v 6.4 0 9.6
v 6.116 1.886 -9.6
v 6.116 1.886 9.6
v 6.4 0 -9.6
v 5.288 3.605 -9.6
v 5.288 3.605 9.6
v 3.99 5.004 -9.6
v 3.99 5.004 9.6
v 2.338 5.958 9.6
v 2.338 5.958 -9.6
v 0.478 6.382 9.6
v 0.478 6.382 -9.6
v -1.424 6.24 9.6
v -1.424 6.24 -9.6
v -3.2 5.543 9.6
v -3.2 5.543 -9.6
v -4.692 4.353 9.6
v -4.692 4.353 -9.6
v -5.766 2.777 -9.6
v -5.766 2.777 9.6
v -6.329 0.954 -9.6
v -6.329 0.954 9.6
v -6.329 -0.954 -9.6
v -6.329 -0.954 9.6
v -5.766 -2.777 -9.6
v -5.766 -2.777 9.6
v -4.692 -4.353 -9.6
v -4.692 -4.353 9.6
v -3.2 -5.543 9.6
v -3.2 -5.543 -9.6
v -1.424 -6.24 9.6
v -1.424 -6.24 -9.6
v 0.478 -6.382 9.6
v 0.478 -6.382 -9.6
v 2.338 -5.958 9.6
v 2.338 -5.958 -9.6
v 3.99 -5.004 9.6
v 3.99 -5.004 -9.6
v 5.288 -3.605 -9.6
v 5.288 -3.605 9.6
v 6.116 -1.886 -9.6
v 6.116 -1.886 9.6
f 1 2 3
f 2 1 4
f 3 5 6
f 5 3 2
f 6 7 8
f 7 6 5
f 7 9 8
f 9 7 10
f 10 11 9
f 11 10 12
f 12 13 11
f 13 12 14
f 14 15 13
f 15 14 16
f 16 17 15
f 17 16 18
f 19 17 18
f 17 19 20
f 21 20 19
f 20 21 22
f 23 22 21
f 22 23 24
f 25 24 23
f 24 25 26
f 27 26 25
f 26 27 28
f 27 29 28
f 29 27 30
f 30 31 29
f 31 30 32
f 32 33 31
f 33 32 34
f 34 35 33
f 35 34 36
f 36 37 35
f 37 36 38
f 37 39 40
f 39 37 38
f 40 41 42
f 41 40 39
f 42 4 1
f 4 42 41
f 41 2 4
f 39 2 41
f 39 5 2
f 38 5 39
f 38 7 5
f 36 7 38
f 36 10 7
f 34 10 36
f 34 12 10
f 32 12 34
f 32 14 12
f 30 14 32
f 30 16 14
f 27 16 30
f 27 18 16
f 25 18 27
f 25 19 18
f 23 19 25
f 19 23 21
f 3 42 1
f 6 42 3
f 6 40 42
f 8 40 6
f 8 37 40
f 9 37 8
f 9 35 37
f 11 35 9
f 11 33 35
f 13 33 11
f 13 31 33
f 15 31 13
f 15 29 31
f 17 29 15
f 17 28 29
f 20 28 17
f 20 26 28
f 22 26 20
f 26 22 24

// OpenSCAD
// file: ../configurations/global.scad
// gold_number = 1.618;

housing_facades_throws_diameter = 3.8;

// external size
case_external_x_size = 165;
case_external_y_size = 92;
case_external_z_size = 38;
case_external_panes_thickness = 4.8;

facade_front_round_edges_radius = 5;
facade_throws_margin = 5;

// facade corners
facade_corners_offset_lenght = 9;
facade_corners_main_x_size = 19;
facade_corners_main_y_size = 19;
facade_corners_main_thickness = 11;
facade_corners_correction_offset_length = 0.2;
facade_corners_correction_offset_thickness = 0.0;
facade_fn = 100;


// Generics
insert_throw_diameter = 4.2;
insert_throw_length = 6 + 2;


// mother board
mother_board_cny70set_x_point_coord = 10;
mother_board_cny70set_y_point_coord = 7;



// Cassette
cassette_x_size = 50;
cassette_y_size = 31;
cassette_z_size = 4.8;
cassette_round_radius = 4;

// Cassette case
cassette_case_x_size = 76.2;
cassette_case_y_size = 55.88;
cassette_case_z_size = 9;
cassette_case_round_radius = 1;

cassette_case_x_y_margin = 0.75;

cassette_case_embed_x_size = 62;
cassette_case_embed_y_size = 42;
cassette_case_embed_z_size = 4.8;
cassette_case_embed_offsets = 10;
cassette_case_embed_round_radius = 6;

cassette_case_throws_margin = 2.54 * 2;
cassette_case_throws_diameter = 3.5;
cassette_case_grip_enveloppe_diameter = 15;
cassette_case_grip_enveloppe_offset = 3;

cassette_case_cny70set_x_point_coord = mother_board_cny70set_x_point_coord;
cassette_case_cny70set_y_point_coord = mother_board_cny70set_y_point_coord;
cassette_case_cny70set_x_y_margin = 0.5;

// Front panel throw cassette case mounting 
cassette_case_embed_throw_margin = 0.5;


// Mother board joins
bolt_join_mother_board_internal_diameter = 3.5;
bolt_join_mother_board_external_diameter = 3.5 + (0.4 * 12);
bolt_join_mother_board_height = 8.5;
bolt_join_fn = 200;


// speaker facade
speaker_facade_x_size = 50;
speaker_facade_y_size = cassette_case_y_size - cassette_case_throws_margin * 2 + 7;
speaker_facade_z_size = 2;
speaker_facade_rounded_radius = 3;
speaker_facade_fixation_throws_margin = 3.5;
speaker_facade_fixation_throws_diameter = 3.5;
speaker_facade_throw_diameter = 40+1;
// 
facade_top_on_off_button_throw_diameter = 12.8;


facade_cassette_case_coords = [
    60 + 5,
    23,
];

facade_speaker_40mm_coords = [
    32 + 5,
    facade_cassette_case_coords[1] + (cassette_case_y_size / 2),
];

batteries_holder_coords = [
    8 + 5,
    20
];

volume_buttons_spacing = 20;
//volume_buttons_coords = [145,50];
volume_buttons_coords = [
    145 + 5 ,
    facade_cassette_case_coords[1] + (cassette_case_y_size / 2),
];

controller_buttons_spacing = 20;
//controller_buttons_coords = [98,14];
controller_buttons_coords = [
    facade_cassette_case_coords[0] + (cassette_case_x_size / 2),
    14
];

controller_onoff_coords = [
    32 + 5,
    14
];
// main file
include <../configurations/global.scad>

// @todo move to modules ?

/**
 * onOffButtonThrowEnveloppe
 * @name onOffButtonThrowEnveloppe
 * @description onOffButtonThrowEnveloppe
 * @type enveloppe
 * @parent root
 */
module onOffButtonThrowEnveloppe(
    z_size = case_external_panes_thickness * 4,
    throw_diameter = facade_top_on_off_button_throw_diameter
) {
    cylinder(h = z_size, d = throw_diameter, center = true, $fn = $fn);
}

onOffButtonThrowEnveloppe();
